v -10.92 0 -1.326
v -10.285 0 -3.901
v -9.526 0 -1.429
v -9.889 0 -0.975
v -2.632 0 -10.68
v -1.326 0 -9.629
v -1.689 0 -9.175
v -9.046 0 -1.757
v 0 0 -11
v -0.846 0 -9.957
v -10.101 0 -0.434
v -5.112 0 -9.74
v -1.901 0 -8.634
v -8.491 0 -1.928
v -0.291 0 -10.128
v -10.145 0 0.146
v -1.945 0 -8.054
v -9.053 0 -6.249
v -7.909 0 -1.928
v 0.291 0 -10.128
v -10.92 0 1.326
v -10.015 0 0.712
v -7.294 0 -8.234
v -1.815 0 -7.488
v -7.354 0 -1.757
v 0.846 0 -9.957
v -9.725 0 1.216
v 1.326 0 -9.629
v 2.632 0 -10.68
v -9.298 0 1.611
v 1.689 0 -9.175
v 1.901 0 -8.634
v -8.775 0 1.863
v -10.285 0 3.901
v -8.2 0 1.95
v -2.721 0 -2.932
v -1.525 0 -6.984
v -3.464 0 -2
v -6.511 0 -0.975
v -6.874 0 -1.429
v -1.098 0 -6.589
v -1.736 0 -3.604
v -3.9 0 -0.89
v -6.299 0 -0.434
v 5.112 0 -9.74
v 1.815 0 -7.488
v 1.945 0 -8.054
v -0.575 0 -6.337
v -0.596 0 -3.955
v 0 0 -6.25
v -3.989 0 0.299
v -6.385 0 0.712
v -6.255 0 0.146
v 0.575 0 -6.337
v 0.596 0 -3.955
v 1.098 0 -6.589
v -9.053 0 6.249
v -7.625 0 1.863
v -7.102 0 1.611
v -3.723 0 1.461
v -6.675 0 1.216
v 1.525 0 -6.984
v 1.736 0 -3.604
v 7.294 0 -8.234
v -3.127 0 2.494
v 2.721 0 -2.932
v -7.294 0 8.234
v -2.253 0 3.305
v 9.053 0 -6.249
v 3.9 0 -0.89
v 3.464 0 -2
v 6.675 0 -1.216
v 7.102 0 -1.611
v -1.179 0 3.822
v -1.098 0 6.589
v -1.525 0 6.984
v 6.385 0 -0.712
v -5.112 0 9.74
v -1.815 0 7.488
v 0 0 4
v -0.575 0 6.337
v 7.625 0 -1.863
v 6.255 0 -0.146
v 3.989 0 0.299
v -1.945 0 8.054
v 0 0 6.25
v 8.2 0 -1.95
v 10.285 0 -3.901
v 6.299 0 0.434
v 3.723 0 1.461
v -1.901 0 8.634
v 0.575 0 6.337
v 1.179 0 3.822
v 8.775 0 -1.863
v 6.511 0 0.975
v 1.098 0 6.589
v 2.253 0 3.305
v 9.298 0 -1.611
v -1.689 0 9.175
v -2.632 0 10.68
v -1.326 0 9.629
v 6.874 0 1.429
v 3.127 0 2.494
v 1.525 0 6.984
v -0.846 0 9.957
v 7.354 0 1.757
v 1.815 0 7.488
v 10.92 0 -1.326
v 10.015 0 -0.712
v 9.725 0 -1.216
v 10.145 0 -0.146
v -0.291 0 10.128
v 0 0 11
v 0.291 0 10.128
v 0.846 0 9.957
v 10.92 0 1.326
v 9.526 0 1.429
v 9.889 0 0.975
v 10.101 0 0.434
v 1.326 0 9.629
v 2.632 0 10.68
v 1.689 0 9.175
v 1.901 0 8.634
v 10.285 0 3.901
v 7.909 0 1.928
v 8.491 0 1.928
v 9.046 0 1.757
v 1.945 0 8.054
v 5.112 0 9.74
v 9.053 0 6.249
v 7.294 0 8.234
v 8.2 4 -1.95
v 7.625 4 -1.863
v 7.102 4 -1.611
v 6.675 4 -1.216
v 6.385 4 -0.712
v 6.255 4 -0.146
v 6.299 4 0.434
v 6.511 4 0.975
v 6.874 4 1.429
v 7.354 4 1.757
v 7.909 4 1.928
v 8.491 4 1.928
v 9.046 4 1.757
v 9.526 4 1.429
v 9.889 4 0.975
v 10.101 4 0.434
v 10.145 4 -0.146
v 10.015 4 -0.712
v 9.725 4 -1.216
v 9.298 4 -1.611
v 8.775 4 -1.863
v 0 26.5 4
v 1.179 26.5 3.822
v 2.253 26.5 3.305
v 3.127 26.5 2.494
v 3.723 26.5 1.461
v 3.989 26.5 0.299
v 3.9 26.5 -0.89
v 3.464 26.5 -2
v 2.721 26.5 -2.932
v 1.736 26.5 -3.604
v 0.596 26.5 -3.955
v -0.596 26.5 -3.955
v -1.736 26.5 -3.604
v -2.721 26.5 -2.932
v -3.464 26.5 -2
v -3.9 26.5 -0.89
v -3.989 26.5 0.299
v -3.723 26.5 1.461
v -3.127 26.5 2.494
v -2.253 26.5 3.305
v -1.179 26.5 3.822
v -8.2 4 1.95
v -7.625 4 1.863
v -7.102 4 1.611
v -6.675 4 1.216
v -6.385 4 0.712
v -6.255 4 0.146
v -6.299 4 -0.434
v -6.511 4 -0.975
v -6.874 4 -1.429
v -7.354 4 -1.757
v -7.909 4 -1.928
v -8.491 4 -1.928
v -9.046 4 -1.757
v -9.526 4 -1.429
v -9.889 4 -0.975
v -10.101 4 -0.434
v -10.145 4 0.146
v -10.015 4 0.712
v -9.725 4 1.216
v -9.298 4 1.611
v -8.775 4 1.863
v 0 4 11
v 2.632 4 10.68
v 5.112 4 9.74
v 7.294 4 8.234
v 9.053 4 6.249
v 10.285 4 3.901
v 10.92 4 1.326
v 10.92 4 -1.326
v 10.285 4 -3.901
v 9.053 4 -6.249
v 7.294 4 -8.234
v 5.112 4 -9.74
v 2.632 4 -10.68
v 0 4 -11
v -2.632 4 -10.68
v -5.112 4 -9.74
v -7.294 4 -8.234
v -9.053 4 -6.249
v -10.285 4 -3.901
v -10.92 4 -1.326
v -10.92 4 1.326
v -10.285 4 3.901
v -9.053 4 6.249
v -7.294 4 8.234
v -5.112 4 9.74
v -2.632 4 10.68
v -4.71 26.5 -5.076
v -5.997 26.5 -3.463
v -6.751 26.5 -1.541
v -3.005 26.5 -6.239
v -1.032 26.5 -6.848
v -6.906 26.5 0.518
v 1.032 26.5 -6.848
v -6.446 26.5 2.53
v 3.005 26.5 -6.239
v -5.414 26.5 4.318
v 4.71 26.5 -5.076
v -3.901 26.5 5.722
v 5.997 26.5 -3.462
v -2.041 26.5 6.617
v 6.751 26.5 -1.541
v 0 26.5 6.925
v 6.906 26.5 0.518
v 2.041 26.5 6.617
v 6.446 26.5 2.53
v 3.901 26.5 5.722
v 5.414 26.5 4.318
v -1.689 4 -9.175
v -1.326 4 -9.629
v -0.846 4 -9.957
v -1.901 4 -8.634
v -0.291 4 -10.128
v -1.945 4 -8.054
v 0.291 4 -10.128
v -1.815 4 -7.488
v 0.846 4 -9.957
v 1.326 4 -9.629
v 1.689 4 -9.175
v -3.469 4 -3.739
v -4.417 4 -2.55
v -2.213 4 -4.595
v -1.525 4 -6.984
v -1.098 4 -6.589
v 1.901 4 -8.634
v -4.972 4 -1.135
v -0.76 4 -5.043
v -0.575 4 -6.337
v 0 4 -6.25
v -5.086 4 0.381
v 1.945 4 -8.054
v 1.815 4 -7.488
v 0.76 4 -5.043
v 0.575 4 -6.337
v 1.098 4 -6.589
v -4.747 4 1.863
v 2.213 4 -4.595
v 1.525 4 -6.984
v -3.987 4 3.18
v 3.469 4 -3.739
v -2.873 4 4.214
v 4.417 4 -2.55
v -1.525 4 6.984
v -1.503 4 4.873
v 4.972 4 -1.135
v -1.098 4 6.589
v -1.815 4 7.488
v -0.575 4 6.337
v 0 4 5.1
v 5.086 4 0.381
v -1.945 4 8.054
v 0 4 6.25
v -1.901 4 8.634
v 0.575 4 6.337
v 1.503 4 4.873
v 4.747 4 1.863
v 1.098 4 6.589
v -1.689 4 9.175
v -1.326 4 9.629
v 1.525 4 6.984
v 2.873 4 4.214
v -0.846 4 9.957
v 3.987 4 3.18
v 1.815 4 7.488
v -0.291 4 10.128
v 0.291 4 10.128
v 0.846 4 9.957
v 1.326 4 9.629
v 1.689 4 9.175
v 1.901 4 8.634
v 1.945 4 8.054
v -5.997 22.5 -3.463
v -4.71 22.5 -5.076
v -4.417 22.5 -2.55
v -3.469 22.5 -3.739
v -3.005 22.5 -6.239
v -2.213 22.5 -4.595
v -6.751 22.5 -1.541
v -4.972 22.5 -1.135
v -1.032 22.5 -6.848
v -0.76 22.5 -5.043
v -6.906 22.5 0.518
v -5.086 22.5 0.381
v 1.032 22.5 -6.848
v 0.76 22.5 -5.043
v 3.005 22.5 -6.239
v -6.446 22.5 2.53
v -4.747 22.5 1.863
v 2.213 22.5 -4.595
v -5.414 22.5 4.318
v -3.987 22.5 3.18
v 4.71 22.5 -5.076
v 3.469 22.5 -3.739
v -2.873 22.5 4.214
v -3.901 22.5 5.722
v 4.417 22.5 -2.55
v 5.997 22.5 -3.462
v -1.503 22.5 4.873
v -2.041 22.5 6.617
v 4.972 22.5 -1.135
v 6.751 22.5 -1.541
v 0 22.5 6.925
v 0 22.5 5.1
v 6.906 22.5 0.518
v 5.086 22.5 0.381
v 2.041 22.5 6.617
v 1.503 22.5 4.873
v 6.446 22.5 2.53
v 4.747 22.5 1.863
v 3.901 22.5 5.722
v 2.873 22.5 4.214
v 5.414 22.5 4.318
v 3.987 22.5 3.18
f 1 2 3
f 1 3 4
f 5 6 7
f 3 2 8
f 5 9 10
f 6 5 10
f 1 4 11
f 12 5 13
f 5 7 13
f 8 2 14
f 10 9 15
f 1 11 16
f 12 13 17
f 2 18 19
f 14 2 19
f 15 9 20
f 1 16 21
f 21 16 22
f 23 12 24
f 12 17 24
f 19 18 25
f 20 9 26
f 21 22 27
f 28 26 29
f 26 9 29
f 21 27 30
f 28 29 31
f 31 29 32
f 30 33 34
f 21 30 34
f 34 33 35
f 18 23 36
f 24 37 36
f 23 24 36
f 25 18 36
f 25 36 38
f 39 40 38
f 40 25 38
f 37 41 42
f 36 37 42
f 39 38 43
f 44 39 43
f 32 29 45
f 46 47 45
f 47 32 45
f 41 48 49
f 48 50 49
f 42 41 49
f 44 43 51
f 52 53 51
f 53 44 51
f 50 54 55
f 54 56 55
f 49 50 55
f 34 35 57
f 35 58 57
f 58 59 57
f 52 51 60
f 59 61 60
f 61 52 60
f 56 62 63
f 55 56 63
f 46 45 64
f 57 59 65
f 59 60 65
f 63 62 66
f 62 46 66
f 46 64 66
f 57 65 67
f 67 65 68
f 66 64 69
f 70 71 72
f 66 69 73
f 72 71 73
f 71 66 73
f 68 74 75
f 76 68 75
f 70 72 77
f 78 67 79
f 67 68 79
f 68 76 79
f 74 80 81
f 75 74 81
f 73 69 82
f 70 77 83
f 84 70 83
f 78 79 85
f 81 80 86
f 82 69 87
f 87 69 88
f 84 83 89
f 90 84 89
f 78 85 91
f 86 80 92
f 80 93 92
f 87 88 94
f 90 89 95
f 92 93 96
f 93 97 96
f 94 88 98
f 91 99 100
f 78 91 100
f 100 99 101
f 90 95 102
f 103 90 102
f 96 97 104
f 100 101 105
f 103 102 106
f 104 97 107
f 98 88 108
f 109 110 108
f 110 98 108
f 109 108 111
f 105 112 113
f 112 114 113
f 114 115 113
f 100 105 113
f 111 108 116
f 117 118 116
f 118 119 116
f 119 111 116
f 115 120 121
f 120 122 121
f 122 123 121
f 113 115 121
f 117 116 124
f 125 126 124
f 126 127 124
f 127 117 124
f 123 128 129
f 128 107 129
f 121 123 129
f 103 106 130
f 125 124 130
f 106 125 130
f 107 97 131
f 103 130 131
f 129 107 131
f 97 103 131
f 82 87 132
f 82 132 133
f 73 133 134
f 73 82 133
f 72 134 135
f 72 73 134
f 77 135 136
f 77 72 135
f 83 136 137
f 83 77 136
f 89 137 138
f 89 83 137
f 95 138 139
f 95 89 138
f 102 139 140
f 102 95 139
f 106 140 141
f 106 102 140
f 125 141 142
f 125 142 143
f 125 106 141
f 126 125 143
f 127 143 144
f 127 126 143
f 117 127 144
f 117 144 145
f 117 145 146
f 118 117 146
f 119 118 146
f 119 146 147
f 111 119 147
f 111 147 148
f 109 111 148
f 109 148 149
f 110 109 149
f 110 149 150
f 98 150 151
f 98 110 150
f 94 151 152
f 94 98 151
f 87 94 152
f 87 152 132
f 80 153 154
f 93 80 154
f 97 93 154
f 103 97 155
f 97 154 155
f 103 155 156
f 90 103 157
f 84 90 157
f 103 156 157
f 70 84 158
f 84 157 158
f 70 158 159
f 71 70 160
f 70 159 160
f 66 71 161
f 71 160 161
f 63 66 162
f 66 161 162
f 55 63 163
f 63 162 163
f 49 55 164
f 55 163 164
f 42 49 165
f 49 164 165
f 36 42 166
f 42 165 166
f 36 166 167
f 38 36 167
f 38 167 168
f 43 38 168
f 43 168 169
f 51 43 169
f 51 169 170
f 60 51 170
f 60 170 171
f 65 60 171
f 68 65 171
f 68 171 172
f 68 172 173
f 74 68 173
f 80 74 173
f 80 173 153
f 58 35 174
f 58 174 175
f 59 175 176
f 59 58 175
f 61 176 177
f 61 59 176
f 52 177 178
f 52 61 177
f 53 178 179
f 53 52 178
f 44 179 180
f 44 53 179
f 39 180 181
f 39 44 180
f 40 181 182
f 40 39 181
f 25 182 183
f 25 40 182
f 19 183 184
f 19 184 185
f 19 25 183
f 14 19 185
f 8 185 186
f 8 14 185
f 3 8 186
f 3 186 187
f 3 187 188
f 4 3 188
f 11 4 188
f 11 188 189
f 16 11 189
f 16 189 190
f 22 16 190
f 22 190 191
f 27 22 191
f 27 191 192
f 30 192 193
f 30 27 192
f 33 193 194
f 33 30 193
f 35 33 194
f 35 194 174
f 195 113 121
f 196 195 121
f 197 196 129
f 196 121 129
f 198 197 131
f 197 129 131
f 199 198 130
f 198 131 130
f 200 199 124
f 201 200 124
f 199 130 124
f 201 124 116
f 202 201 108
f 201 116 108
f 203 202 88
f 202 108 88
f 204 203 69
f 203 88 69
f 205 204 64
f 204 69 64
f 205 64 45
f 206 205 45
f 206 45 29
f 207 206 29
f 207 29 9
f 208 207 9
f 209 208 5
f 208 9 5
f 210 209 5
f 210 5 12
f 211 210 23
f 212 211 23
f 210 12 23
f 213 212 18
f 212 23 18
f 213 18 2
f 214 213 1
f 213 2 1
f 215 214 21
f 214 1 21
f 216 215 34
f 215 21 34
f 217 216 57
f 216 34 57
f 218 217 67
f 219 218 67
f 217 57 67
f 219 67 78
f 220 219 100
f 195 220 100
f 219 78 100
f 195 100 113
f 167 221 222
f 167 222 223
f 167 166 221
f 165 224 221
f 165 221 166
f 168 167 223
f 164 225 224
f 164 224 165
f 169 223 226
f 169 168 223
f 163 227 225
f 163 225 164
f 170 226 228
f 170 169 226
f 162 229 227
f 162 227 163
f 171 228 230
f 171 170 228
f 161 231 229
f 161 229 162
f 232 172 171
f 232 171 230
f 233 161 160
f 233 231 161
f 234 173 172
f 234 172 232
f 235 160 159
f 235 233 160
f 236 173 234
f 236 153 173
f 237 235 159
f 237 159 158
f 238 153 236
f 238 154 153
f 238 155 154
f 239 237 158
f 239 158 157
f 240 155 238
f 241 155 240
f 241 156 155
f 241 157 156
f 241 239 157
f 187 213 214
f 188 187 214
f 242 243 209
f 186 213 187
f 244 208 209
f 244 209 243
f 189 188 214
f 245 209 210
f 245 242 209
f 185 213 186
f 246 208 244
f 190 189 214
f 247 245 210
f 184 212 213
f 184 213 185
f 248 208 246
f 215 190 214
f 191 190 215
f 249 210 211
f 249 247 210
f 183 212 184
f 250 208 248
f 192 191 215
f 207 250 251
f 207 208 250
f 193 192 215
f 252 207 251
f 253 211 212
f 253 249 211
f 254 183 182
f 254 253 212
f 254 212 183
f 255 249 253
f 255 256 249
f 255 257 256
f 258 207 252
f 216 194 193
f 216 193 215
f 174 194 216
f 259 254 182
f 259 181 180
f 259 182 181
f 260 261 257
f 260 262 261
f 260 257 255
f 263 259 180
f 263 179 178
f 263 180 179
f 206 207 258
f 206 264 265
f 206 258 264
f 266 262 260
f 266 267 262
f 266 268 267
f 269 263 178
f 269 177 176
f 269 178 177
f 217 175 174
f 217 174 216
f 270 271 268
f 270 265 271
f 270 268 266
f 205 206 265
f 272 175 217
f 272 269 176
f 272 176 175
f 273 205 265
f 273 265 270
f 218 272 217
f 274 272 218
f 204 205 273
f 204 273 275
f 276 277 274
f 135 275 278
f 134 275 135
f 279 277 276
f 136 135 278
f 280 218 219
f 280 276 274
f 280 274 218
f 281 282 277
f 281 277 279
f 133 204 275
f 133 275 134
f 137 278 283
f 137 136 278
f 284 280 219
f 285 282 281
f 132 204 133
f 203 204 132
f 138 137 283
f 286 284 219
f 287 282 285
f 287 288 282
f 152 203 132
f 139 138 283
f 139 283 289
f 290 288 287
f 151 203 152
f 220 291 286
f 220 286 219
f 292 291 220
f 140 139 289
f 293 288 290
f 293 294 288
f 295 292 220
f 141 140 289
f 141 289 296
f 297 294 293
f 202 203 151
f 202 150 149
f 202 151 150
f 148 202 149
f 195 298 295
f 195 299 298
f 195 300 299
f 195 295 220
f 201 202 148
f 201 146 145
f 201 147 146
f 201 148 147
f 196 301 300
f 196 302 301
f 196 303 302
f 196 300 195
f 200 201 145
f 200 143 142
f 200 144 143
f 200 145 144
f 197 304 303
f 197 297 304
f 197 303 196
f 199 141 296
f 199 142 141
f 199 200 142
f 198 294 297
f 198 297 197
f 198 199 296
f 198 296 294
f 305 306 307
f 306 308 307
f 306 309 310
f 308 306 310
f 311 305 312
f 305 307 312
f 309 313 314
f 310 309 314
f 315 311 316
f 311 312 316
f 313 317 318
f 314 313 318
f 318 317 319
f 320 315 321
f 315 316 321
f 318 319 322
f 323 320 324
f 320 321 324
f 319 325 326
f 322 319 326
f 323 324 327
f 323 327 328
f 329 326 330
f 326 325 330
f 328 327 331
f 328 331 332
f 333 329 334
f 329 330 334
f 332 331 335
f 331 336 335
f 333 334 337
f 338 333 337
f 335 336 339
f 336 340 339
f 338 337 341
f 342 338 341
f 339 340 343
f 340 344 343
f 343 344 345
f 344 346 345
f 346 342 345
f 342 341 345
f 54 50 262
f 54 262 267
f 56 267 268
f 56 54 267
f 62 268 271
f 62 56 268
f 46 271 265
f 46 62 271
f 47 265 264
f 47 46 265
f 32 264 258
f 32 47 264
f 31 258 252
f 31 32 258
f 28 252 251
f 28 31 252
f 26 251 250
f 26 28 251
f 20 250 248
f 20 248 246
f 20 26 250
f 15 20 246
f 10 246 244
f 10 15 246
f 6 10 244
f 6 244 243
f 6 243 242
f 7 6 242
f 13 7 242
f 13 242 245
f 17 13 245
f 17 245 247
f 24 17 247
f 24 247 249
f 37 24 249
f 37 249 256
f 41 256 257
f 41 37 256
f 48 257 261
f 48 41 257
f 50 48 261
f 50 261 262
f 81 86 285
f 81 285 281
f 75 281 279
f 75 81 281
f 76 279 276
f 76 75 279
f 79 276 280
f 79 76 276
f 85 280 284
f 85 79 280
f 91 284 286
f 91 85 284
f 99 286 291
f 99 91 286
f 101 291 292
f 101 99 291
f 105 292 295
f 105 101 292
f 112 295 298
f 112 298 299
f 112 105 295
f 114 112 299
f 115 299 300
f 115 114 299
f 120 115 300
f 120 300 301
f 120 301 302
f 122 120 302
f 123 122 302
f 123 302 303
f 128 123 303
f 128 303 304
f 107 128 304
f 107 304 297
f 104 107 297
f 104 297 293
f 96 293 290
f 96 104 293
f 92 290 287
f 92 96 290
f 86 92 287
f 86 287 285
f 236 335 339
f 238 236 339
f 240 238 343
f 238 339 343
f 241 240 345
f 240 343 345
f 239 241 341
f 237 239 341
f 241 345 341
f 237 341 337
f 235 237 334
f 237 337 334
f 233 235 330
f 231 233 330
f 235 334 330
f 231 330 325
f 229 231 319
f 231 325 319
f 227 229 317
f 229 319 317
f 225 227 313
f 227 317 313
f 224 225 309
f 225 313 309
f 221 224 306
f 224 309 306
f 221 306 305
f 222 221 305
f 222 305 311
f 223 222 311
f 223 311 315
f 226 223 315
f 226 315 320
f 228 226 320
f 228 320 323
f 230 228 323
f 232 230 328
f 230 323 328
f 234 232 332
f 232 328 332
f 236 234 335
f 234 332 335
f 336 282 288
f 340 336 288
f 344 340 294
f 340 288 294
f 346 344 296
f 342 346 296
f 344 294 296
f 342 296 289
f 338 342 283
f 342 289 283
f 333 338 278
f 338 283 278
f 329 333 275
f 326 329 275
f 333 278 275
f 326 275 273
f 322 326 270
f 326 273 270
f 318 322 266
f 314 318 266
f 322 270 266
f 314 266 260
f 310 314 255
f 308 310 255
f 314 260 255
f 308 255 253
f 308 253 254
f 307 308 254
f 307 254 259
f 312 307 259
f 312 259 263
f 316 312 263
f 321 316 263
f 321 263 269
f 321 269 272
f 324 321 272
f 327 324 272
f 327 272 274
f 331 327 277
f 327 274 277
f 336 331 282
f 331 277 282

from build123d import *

# Parameters (mm, degrees)
SKETCH1_R           = 11
SKETCH1_R_2         = 1.95
BOSS_EXTRUDE1_DEPTH = 4
SKETCH2_R           = 5.1
BOSS_EXTRUDE2_DEPTH = 18.5
SKETCH3_R           = 6.925
BOSS_EXTRUDE3_DEPTH = 4
SKETCH4_R           = 4
CUT_EXTRUDE1_DEPTH  = 31.728651126


with BuildPart() as part:
    # Sketch1 → Boss-Extrude1 (new body)
    with BuildSketch(Plane(origin=(0, 0, 0), x_dir=(1, 0, 0), z_dir=(0, 1, 0))):
        with Locations(Location((0, 0, 0), (0, 0, 270))):
            Circle(SKETCH1_R)
        with Locations(Location((-8.2, 0, 0), (0, 0, 270))):
            Circle(SKETCH1_R_2, mode=Mode.SUBTRACT)
        with Locations(Location((8.2, 0, 0), (0, 0, 90))):
            Circle(SKETCH1_R_2, mode=Mode.SUBTRACT)
        with Locations(Location((0, 8.2, 0), (0, 0, 270))):
            Circle(SKETCH1_R_2, mode=Mode.SUBTRACT)
        with Locations(Location((0, -8.2, 0), (0, 0, 90))):
            Circle(SKETCH1_R_2, mode=Mode.SUBTRACT)
    extrude(amount=BOSS_EXTRUDE1_DEPTH)

    # Sketch2 → Boss-Extrude2 (add)
    with BuildSketch(Plane(origin=(0, 4, 0), x_dir=(1, 0, 0), z_dir=(0, 1, 0))):
        with Locations(Location((0, 0, 0), (0, 0, 270))):
            Circle(SKETCH2_R)
    extrude(amount=BOSS_EXTRUDE2_DEPTH)

    # Sketch3 → Boss-Extrude3 (add)
    with BuildSketch(Plane(origin=(0, 22.5, 0), x_dir=(1, 0, 0), z_dir=(0, 1, 0))):
        with Locations(Location((0, 0, 0), (0, 0, 270))):
            Circle(SKETCH3_R)
    extrude(amount=BOSS_EXTRUDE3_DEPTH)

    # Sketch4 → Cut-Extrude1 (cut, through all)
    with BuildSketch(Plane(origin=(0, 26.5, 0), x_dir=(1, 0, 0), z_dir=(0, 1, 0))):
        with Locations(Location((0, 0, 0), (0, 0, 270))):
            Circle(SKETCH4_R)
    extrude(amount=-CUT_EXTRUDE1_DEPTH, mode=Mode.SUBTRACT)


solid = part.part
